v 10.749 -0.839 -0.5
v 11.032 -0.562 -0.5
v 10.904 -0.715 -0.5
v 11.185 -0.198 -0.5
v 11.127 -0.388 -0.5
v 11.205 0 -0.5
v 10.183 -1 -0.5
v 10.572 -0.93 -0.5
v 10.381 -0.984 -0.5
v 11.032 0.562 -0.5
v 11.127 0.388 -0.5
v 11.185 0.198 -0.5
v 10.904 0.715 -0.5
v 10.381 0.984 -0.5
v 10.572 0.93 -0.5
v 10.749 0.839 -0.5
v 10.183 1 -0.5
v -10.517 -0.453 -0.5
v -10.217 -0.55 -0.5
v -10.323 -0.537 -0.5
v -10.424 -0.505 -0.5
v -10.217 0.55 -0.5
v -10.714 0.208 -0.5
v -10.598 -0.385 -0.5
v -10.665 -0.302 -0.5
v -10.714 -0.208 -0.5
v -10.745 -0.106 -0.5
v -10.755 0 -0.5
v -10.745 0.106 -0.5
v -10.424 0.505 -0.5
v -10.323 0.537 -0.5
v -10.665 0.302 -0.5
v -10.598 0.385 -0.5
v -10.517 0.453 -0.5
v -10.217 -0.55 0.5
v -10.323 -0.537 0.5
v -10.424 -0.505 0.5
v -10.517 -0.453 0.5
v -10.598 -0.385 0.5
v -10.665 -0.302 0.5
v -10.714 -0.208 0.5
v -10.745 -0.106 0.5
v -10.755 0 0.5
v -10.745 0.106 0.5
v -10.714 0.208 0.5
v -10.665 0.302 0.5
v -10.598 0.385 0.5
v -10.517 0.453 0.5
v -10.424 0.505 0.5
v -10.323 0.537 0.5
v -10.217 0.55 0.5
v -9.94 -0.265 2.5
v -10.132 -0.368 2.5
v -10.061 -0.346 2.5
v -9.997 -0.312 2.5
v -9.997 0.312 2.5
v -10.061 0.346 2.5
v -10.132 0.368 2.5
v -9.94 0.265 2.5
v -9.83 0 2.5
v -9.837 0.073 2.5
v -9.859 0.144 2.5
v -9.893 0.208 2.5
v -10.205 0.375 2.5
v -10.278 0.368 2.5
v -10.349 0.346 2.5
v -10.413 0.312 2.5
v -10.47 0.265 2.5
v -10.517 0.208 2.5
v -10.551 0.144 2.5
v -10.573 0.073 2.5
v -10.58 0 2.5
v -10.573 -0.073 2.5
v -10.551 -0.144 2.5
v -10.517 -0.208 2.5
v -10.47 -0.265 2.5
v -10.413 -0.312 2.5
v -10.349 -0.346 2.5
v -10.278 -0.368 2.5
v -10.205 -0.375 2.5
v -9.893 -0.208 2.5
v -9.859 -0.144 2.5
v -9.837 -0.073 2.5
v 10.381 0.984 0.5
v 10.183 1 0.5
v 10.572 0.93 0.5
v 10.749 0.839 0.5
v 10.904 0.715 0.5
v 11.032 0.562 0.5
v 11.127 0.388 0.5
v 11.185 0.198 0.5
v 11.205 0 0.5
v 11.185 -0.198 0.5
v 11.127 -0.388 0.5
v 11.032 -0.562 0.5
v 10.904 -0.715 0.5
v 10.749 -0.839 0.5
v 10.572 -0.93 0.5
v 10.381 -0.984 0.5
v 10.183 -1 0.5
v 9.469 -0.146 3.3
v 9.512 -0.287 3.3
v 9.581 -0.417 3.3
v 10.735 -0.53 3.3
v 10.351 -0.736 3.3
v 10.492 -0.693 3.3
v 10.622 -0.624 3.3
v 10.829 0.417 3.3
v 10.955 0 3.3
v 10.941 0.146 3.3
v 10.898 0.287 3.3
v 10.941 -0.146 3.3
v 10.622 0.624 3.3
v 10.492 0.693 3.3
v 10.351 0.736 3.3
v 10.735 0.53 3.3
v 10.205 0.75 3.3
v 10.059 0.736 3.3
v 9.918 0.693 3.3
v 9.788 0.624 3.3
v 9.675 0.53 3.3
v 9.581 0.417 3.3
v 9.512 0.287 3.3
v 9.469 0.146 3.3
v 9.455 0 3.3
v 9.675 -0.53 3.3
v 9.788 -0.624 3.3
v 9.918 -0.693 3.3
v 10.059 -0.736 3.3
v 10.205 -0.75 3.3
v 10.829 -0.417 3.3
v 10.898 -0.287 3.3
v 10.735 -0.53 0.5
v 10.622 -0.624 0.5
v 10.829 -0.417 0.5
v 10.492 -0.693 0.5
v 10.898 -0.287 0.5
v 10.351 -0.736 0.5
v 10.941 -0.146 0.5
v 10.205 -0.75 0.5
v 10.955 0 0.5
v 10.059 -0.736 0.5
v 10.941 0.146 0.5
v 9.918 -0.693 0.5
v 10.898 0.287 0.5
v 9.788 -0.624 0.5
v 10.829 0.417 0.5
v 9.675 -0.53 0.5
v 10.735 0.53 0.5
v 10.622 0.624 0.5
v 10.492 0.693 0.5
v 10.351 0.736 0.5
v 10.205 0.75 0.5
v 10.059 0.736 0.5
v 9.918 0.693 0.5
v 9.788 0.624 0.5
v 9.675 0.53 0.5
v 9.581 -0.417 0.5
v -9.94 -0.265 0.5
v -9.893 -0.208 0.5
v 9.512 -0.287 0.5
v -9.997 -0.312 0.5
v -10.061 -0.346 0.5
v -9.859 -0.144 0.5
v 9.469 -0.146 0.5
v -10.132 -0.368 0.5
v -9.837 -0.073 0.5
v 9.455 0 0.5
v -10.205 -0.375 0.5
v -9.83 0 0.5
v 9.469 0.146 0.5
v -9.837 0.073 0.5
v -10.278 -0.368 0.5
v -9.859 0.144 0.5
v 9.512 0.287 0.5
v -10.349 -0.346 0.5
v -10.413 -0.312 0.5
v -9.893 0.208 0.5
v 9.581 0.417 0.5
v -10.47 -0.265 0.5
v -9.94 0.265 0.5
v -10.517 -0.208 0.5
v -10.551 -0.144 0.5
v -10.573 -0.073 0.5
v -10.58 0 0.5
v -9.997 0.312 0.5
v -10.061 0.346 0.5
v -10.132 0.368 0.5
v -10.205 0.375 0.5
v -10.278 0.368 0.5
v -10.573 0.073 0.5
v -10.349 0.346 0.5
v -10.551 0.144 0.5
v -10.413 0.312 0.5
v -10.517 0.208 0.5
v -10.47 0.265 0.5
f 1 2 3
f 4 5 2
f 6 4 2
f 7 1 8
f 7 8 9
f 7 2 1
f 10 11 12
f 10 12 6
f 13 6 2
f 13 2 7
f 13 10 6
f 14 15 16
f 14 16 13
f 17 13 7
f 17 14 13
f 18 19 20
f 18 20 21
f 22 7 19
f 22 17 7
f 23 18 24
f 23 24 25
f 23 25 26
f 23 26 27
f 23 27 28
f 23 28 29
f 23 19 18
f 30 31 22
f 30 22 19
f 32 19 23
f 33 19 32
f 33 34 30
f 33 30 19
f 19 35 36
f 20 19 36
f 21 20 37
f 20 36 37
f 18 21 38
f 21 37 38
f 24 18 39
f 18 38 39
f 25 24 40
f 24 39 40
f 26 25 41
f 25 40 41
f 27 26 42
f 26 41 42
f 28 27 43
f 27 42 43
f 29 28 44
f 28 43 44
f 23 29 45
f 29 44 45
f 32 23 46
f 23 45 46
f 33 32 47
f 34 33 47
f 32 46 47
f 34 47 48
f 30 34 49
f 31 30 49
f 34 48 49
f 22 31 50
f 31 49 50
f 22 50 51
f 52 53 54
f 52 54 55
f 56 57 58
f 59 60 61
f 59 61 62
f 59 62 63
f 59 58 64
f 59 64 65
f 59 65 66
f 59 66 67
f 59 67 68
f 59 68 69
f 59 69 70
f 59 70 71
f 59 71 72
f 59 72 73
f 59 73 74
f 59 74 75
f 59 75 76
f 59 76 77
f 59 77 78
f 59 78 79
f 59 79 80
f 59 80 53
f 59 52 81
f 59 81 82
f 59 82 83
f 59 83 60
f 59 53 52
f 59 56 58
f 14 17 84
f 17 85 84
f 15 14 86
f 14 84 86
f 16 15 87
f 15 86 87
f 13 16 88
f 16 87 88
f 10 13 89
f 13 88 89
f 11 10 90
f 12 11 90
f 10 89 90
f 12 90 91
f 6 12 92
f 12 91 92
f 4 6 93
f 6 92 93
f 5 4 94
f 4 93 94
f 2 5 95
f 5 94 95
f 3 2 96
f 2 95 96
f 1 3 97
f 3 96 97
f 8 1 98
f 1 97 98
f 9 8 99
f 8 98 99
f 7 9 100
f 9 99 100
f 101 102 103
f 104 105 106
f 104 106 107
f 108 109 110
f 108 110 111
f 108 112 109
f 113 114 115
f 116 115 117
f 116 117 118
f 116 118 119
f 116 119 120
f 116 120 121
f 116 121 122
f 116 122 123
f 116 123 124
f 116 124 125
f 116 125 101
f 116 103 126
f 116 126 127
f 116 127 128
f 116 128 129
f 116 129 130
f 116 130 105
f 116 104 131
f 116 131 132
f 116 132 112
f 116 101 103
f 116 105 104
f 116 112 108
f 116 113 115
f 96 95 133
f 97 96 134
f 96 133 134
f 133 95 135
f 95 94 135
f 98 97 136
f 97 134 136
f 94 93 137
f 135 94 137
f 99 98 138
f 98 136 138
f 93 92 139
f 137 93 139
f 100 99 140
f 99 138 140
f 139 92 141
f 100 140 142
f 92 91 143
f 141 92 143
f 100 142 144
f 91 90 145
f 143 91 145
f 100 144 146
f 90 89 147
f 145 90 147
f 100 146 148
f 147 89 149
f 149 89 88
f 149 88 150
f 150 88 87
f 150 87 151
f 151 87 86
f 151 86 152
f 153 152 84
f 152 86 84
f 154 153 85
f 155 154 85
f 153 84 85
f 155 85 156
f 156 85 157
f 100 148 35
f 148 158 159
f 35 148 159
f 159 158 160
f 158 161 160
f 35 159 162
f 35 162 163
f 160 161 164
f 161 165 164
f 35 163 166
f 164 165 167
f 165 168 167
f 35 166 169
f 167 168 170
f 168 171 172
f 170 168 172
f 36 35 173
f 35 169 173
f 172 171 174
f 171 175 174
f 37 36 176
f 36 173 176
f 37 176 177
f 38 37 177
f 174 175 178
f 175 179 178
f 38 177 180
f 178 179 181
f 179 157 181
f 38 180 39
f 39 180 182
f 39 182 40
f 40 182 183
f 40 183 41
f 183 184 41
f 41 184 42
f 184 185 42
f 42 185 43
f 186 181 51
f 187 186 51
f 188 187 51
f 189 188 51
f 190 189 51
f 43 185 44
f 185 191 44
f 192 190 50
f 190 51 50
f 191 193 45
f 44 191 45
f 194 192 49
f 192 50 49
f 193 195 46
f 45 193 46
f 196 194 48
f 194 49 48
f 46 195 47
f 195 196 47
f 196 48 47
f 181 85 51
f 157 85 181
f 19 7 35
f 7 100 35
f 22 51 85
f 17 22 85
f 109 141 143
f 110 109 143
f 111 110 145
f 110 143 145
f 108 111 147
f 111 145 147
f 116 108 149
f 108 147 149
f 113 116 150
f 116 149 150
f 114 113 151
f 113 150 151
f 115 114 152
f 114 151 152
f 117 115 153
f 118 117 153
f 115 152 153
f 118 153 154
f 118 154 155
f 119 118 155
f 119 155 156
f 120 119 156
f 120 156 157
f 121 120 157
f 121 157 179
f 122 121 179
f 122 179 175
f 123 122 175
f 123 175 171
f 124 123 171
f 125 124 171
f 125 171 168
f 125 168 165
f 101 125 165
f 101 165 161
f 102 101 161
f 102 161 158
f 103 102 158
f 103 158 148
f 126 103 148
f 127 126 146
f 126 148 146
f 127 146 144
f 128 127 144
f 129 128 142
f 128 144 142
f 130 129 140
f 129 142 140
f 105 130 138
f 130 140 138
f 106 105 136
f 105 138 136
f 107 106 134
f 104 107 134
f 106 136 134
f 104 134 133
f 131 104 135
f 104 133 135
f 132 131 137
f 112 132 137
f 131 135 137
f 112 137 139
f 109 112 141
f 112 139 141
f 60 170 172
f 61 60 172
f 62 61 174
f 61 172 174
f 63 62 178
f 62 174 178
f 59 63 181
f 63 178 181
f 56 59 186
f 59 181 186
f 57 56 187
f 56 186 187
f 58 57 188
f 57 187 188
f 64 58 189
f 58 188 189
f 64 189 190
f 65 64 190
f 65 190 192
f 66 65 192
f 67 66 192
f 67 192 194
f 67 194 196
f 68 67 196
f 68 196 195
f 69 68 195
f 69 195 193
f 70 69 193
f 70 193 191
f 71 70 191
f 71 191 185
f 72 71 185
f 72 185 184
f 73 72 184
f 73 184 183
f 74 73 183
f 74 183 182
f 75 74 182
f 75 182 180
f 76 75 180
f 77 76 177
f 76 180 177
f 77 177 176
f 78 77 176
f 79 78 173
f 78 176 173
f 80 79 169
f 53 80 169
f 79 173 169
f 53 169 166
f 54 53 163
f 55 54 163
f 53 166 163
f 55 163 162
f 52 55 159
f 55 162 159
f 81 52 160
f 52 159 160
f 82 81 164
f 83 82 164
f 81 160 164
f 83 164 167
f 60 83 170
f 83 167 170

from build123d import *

# Parameters (mm, degrees)
SKETCH1_R           = 0.375
SKETCH1_R_2         = 0.75
BOSS_EXTRUDE1_DEPTH = 0.5
SKETCH1_2_R         = 0.375
BOSS_EXTRUDE2_DEPTH = 2.5
SKETCH1_3_R         = 0.75
BOSS_EXTRUDE3_DEPTH = 3.3
SKETCH2_R           = 0.375
SKETCH2_R_2         = 0.75
BOSS_EXTRUDE4_DEPTH = 0.5


with BuildPart() as part:
    # Sketch1 → Boss-Extrude1 (new body, symmetric)
    with BuildSketch(Plane.XY):
        with BuildLine():
            Line((-10.217126409, 0.549866302), (10.182951984, 0.999756913))
            ThreePointArc((10.182951984, 0.999756913), (11.205, 0), (10.182951984, -0.999756913))
            Line((10.182951984, -0.999756913), (-10.217126409, -0.549866302))
            ThreePointArc((-10.217126409, -0.549866302), (-10.755, 0), (-10.217126409, 0.549866302))
        make_face()
        with Locations((-10.205, 0)):
            Circle(SKETCH1_R, mode=Mode.SUBTRACT)
        with Locations((10.205, 0)):
            Circle(SKETCH1_R_2, mode=Mode.SUBTRACT)
    extrude(amount=BOSS_EXTRUDE1_DEPTH, both=True)

    # Sketch1<2> → Boss-Extrude2 (add)
    with BuildSketch(Plane.XY):
        with Locations((-10.205, 0)):
            Circle(SKETCH1_2_R)
    extrude(amount=BOSS_EXTRUDE2_DEPTH)

    # Sketch1<3> → Boss-Extrude3 (add)
    with BuildSketch(Plane.XY):
        with Locations((10.205, 0)):
            Circle(SKETCH1_3_R)
    extrude(amount=BOSS_EXTRUDE3_DEPTH)

    # Sketch2 → Boss-Extrude4 (add)
    with BuildSketch(Plane(origin=(0, 0, 0), x_dir=(-1, 0, 0), z_dir=(0, 0, -1))):
        with Locations((10.205, 0)):
            Circle(SKETCH2_R)
        with Locations((-10.205, 0)):
            Circle(SKETCH2_R_2)
    extrude(amount=BOSS_EXTRUDE4_DEPTH)


solid = part.part
